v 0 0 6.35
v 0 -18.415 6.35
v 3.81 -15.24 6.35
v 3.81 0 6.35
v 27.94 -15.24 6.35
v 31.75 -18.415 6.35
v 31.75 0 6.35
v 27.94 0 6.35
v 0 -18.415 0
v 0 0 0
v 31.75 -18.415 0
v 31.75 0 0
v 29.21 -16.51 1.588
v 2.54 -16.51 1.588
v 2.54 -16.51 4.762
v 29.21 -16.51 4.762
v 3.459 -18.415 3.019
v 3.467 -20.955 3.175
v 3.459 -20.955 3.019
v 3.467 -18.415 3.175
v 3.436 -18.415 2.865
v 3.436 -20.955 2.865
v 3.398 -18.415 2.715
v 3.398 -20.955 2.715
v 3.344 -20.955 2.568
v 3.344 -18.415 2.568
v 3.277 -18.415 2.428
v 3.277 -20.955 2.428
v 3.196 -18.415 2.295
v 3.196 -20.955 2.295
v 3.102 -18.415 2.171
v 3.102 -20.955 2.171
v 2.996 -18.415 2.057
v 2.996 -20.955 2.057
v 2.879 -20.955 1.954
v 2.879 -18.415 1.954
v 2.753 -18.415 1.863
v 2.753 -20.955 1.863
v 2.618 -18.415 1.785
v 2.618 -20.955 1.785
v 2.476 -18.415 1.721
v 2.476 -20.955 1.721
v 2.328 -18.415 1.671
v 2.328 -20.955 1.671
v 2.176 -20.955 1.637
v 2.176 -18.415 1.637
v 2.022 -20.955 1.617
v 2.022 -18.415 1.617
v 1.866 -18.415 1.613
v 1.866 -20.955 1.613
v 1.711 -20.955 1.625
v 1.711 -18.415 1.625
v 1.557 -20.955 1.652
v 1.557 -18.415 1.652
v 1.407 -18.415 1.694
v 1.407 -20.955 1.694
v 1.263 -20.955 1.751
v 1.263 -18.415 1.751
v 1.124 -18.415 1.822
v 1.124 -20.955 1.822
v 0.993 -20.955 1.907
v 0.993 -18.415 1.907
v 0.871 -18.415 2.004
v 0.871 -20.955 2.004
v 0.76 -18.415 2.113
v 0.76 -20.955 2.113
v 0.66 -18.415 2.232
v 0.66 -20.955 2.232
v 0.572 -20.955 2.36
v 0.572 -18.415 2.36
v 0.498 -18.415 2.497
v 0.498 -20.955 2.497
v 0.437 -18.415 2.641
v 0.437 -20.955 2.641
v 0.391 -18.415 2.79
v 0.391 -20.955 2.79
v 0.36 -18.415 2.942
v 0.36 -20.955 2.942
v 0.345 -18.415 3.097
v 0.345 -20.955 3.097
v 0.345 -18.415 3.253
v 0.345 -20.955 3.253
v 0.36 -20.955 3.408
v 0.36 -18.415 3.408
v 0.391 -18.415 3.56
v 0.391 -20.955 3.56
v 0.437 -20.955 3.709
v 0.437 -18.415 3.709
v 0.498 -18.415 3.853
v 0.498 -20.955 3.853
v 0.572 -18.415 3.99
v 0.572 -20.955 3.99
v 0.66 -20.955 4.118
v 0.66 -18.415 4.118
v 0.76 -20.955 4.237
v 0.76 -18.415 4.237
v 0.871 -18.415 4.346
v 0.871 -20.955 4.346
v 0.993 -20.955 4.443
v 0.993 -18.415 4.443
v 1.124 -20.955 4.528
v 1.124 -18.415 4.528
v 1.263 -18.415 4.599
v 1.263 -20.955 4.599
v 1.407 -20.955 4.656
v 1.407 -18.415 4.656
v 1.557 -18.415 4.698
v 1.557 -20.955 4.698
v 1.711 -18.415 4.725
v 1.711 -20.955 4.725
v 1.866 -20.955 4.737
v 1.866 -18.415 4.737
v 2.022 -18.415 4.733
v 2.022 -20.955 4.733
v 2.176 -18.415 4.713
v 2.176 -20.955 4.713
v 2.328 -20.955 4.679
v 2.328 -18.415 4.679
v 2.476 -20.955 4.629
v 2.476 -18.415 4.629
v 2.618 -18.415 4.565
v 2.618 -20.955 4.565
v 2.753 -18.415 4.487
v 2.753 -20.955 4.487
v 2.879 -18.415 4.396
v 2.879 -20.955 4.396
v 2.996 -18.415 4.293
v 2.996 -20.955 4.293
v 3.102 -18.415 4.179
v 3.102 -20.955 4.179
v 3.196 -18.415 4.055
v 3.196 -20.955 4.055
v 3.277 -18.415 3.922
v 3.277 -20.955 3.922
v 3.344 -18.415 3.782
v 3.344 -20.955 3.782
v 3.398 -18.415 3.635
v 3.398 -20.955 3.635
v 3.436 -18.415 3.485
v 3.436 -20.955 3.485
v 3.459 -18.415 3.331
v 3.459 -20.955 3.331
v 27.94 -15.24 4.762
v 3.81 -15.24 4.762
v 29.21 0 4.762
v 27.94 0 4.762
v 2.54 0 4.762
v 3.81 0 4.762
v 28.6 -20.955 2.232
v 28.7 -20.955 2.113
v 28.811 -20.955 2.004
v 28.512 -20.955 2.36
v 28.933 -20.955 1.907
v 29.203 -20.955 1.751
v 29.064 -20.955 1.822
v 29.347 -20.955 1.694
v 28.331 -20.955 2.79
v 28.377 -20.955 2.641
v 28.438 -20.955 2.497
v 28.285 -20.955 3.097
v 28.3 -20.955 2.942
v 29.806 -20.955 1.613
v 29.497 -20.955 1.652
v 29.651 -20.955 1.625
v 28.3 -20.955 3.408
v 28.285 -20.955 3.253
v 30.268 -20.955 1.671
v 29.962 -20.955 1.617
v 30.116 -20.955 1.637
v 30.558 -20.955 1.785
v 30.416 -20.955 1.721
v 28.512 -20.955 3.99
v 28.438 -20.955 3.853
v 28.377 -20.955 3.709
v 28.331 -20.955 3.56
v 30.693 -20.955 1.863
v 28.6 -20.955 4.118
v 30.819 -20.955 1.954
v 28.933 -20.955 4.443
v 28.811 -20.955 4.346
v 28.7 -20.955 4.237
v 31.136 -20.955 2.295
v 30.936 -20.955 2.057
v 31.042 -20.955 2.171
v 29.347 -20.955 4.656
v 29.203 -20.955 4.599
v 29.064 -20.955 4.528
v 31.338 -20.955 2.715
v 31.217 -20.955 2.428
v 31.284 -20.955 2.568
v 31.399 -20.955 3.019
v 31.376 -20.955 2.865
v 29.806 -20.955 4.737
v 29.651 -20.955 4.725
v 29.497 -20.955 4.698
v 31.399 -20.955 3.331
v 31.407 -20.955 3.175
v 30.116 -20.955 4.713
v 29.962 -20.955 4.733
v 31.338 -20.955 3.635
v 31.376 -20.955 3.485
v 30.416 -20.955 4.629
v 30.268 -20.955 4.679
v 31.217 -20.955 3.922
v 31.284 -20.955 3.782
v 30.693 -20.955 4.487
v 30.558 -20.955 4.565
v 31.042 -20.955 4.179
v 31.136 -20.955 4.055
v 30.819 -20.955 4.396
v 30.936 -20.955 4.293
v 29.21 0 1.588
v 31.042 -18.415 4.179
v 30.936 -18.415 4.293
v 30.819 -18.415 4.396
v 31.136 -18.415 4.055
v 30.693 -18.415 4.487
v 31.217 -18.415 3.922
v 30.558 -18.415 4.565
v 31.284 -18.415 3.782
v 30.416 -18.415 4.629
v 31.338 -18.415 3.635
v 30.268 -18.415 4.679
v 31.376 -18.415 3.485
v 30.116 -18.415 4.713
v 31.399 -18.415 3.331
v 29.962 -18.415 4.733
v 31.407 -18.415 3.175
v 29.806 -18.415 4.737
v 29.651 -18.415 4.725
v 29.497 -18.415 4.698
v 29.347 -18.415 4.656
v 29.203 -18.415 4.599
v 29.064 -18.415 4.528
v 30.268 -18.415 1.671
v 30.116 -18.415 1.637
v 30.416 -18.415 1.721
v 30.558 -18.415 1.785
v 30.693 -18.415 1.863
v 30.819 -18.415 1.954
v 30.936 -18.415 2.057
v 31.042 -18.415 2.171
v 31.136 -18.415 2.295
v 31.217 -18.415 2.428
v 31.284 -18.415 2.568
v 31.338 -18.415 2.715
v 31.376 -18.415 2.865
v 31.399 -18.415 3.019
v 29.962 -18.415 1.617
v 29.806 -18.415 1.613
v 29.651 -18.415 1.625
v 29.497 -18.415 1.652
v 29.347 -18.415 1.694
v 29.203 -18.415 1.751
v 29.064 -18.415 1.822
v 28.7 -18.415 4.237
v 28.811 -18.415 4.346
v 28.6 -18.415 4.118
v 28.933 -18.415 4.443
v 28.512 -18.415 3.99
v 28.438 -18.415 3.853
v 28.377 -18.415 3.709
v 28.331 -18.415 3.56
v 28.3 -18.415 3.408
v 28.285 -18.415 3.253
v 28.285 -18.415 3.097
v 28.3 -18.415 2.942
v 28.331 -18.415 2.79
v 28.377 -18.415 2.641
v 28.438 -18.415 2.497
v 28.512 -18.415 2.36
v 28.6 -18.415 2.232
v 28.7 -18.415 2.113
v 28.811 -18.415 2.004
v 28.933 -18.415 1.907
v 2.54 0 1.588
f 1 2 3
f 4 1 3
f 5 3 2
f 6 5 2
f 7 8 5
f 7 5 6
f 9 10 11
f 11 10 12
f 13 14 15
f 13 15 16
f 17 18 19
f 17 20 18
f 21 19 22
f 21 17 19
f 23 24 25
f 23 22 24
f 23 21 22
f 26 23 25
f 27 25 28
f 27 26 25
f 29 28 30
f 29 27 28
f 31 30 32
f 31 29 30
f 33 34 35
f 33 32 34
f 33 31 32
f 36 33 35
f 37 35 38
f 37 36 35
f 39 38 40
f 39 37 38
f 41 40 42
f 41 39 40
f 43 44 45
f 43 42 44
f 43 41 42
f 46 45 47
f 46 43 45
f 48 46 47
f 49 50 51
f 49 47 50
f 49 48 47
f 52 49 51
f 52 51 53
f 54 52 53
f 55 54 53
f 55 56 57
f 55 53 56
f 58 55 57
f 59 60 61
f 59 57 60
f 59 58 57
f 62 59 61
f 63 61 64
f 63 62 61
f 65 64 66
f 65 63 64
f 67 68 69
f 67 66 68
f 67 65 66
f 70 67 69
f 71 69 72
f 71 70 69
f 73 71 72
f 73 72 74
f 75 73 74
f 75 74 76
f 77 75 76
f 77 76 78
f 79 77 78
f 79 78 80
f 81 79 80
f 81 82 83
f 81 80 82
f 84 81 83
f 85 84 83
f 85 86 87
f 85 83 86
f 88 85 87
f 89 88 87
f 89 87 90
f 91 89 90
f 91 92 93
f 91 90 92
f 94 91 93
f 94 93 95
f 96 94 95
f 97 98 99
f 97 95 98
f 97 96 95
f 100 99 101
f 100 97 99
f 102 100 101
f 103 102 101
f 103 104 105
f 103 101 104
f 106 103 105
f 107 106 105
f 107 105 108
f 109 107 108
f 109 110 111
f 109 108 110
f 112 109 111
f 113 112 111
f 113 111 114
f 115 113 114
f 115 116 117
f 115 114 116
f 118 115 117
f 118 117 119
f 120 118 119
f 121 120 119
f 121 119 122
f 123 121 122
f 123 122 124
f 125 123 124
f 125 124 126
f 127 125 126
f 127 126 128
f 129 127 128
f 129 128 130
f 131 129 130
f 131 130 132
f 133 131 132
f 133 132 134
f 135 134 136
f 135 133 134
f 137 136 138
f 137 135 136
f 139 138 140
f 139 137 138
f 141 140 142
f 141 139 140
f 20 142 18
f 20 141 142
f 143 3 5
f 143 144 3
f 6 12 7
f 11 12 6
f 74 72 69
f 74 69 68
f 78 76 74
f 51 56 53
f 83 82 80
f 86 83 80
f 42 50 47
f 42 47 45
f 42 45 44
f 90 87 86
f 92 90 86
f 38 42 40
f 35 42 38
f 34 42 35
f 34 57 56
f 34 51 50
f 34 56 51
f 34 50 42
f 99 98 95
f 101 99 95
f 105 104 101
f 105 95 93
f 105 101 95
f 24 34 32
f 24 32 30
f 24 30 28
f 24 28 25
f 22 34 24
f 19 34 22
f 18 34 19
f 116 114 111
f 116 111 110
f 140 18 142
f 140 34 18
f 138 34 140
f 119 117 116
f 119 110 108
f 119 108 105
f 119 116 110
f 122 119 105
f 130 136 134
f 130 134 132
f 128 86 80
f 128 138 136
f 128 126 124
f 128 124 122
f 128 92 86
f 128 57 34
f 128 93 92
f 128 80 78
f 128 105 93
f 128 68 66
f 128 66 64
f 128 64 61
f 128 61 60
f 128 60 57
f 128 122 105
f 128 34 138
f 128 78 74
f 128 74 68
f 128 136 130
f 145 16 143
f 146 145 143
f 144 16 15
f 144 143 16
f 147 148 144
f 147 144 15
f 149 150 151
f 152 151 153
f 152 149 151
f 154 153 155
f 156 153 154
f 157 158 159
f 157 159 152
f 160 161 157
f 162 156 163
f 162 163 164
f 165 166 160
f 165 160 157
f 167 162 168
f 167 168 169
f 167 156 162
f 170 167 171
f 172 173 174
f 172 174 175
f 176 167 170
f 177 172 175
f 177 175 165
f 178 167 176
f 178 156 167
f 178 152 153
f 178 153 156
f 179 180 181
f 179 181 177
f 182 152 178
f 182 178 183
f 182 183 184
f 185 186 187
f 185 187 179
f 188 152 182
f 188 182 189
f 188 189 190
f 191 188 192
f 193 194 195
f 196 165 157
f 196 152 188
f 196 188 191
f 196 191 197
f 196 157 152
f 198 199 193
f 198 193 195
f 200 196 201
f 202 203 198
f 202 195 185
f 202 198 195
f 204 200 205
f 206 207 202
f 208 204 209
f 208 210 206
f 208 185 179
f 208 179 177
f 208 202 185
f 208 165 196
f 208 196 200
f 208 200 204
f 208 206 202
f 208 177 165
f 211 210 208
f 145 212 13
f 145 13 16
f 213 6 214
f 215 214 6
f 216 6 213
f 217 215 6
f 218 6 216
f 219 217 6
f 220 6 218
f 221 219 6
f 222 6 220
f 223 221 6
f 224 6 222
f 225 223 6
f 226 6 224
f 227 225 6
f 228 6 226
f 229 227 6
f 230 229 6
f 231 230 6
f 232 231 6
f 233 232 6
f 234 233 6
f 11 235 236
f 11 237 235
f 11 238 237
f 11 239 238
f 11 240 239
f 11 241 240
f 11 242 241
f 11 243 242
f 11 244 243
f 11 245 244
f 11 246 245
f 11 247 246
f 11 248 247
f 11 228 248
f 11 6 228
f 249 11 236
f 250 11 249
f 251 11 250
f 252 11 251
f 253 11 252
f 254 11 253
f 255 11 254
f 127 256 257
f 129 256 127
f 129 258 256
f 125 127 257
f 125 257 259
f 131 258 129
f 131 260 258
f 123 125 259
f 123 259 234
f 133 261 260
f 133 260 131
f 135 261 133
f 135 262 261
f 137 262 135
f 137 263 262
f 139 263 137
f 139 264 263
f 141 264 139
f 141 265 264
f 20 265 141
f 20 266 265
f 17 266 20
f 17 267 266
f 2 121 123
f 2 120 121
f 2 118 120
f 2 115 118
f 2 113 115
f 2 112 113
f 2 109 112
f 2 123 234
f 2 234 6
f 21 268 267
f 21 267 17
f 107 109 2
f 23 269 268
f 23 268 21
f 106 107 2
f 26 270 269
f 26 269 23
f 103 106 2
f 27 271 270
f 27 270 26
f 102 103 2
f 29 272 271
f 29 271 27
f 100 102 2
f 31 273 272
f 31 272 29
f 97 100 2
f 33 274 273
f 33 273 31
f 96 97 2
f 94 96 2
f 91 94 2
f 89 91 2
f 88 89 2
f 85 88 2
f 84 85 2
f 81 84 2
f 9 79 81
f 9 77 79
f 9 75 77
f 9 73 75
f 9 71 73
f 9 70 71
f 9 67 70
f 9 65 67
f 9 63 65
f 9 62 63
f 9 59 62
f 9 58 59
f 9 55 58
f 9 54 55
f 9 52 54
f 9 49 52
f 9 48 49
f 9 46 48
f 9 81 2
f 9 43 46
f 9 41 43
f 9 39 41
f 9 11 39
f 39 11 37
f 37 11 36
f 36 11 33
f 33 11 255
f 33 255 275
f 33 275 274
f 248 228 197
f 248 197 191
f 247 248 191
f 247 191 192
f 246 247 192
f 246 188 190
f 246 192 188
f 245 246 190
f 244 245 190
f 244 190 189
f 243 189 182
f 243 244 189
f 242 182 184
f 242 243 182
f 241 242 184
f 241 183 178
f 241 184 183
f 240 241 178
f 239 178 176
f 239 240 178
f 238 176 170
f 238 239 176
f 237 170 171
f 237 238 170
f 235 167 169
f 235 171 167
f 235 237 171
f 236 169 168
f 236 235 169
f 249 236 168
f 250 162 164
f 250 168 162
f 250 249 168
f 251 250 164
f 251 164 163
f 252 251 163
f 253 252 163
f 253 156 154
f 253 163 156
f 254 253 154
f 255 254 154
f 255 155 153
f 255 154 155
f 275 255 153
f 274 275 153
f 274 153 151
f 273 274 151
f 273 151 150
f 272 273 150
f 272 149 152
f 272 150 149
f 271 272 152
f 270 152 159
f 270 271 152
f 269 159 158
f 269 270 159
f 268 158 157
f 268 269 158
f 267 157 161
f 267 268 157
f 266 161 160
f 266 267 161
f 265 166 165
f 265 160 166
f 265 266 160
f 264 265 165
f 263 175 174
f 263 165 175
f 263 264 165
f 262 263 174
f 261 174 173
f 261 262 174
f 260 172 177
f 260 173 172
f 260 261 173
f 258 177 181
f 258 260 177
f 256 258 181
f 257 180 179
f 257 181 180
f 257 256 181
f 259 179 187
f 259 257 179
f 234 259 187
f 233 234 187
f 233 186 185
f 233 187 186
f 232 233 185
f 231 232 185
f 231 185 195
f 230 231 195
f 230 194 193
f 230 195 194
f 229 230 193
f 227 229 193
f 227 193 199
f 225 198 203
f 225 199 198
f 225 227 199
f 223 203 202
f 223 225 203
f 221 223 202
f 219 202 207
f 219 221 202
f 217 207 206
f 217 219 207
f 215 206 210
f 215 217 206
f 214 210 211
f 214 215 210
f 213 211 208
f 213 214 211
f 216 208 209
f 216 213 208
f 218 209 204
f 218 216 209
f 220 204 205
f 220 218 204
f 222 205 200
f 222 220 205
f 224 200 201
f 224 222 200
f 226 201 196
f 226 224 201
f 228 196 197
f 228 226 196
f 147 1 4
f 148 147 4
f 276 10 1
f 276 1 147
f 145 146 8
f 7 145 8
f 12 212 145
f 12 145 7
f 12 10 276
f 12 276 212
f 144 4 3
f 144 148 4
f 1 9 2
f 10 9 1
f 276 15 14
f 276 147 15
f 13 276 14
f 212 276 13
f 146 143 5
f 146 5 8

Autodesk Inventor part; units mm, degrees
ref_plane "YZ Plane" through (0, 0, 0) normal (1, 0, 0) x (0, 1, 0)
ref_plane "XZ Plane" through (0, 0, 0) normal (0, 1, 0) x (-1, 0, 0)
ref_plane "XY Plane" through (0, 0, 0) normal (0, 0, 1) x (1, 0, 0)
sketch "Sketch1" plane through (0, 0, 0) normal (0, 0, 1) x (1, 0, 0)
  line L0 (0, 0) -> (31.75, 0)
  line L1 (31.75, 0) -> (31.75, -18.415)
  line L2 (31.75, -18.415) -> (0, -18.415)
  line L3 (0, -18.415) -> (0, 0)
  dimension "d0" = 31.75
  dimension "d1" = 18.415
extrude "Extrusion1" add sketch "Sketch1" along normal blind 6.35
sketch "Sketch2" plane through (0, 0, 0) normal (0, 1, 0) x (1, 0, 0)
  line L0 (2.54, -1.5875) -> (29.21, -1.5875)
  line L1 (29.21, -1.5875) -> (29.21, -4.7625)
  line L2 (29.21, -4.7625) -> (2.54, -4.7625)
  line L3 (2.54, -4.7625) -> (2.54, -1.5875)
  line L4 (0, 0) -> (0, -6.35) projected
  line L5 (31.75, -6.35) -> (0, -6.35) projected
  dimension "d4" = 26.67
  dimension "d5" = 2.54
  dimension "d6" = 3.175
  dimension "d7" = 1.5875
extrude "Extrusion2" cut sketch "Sketch2" against normal blind 16.51
sketch "Sketch3" plane through (29.21, 0, 4.7625) normal (0, 0, -1) x (-1, 0, 0)
  line L0 (1.27, 0) -> (25.4, 0)
  line L1 (25.4, 0) -> (25.4, -15.24)
  line L2 (25.4, -15.24) -> (1.27, -15.24)
  line L3 (1.27, -15.24) -> (1.27, 0)
  line L4 (26.67, -16.51) -> (0, -16.51) projected
  line L5 (26.67, 0) -> (26.67, -16.51) projected
  line L6 (0, 0) -> (0, -16.51) projected
  line L7 (0, 0) -> (26.67, 0) projected
  point P0 (29.21, 0)
  dimension "d10" = 1.27
  dimension "d11" = 1.27
  dimension "d12" = 1.27
  dimension "d13" = 0
extrude "Extrusion3" cut sketch "Sketch3" against normal blind 16.51 contours L0 L1 L2 L3
sketch "Sketch4" plane through (0, -18.415, 0) normal (0, -1, 0) x (1, 0, 0)
  circle A0 centre (1.905, 3.175) radius 1.5621
  circle A1 centre (29.845, 3.175) radius 1.5621
  line L0 (0, 6.35) -> (31.75, 6.35) projected
  line L1 (0, 0) -> (0, 6.35) projected
  dimension "d16" = 3.1242
  dimension "d17" = 3.1242
  dimension "d18" = 3.175
  dimension "d19" = 3.175
  dimension "d20" = 27.94
  dimension "d21" = 1.905
extrude "Extrusion4" add sketch "Sketch4" along normal blind 2.54
properties part number "CameraMount" material "ABS Plastic"
